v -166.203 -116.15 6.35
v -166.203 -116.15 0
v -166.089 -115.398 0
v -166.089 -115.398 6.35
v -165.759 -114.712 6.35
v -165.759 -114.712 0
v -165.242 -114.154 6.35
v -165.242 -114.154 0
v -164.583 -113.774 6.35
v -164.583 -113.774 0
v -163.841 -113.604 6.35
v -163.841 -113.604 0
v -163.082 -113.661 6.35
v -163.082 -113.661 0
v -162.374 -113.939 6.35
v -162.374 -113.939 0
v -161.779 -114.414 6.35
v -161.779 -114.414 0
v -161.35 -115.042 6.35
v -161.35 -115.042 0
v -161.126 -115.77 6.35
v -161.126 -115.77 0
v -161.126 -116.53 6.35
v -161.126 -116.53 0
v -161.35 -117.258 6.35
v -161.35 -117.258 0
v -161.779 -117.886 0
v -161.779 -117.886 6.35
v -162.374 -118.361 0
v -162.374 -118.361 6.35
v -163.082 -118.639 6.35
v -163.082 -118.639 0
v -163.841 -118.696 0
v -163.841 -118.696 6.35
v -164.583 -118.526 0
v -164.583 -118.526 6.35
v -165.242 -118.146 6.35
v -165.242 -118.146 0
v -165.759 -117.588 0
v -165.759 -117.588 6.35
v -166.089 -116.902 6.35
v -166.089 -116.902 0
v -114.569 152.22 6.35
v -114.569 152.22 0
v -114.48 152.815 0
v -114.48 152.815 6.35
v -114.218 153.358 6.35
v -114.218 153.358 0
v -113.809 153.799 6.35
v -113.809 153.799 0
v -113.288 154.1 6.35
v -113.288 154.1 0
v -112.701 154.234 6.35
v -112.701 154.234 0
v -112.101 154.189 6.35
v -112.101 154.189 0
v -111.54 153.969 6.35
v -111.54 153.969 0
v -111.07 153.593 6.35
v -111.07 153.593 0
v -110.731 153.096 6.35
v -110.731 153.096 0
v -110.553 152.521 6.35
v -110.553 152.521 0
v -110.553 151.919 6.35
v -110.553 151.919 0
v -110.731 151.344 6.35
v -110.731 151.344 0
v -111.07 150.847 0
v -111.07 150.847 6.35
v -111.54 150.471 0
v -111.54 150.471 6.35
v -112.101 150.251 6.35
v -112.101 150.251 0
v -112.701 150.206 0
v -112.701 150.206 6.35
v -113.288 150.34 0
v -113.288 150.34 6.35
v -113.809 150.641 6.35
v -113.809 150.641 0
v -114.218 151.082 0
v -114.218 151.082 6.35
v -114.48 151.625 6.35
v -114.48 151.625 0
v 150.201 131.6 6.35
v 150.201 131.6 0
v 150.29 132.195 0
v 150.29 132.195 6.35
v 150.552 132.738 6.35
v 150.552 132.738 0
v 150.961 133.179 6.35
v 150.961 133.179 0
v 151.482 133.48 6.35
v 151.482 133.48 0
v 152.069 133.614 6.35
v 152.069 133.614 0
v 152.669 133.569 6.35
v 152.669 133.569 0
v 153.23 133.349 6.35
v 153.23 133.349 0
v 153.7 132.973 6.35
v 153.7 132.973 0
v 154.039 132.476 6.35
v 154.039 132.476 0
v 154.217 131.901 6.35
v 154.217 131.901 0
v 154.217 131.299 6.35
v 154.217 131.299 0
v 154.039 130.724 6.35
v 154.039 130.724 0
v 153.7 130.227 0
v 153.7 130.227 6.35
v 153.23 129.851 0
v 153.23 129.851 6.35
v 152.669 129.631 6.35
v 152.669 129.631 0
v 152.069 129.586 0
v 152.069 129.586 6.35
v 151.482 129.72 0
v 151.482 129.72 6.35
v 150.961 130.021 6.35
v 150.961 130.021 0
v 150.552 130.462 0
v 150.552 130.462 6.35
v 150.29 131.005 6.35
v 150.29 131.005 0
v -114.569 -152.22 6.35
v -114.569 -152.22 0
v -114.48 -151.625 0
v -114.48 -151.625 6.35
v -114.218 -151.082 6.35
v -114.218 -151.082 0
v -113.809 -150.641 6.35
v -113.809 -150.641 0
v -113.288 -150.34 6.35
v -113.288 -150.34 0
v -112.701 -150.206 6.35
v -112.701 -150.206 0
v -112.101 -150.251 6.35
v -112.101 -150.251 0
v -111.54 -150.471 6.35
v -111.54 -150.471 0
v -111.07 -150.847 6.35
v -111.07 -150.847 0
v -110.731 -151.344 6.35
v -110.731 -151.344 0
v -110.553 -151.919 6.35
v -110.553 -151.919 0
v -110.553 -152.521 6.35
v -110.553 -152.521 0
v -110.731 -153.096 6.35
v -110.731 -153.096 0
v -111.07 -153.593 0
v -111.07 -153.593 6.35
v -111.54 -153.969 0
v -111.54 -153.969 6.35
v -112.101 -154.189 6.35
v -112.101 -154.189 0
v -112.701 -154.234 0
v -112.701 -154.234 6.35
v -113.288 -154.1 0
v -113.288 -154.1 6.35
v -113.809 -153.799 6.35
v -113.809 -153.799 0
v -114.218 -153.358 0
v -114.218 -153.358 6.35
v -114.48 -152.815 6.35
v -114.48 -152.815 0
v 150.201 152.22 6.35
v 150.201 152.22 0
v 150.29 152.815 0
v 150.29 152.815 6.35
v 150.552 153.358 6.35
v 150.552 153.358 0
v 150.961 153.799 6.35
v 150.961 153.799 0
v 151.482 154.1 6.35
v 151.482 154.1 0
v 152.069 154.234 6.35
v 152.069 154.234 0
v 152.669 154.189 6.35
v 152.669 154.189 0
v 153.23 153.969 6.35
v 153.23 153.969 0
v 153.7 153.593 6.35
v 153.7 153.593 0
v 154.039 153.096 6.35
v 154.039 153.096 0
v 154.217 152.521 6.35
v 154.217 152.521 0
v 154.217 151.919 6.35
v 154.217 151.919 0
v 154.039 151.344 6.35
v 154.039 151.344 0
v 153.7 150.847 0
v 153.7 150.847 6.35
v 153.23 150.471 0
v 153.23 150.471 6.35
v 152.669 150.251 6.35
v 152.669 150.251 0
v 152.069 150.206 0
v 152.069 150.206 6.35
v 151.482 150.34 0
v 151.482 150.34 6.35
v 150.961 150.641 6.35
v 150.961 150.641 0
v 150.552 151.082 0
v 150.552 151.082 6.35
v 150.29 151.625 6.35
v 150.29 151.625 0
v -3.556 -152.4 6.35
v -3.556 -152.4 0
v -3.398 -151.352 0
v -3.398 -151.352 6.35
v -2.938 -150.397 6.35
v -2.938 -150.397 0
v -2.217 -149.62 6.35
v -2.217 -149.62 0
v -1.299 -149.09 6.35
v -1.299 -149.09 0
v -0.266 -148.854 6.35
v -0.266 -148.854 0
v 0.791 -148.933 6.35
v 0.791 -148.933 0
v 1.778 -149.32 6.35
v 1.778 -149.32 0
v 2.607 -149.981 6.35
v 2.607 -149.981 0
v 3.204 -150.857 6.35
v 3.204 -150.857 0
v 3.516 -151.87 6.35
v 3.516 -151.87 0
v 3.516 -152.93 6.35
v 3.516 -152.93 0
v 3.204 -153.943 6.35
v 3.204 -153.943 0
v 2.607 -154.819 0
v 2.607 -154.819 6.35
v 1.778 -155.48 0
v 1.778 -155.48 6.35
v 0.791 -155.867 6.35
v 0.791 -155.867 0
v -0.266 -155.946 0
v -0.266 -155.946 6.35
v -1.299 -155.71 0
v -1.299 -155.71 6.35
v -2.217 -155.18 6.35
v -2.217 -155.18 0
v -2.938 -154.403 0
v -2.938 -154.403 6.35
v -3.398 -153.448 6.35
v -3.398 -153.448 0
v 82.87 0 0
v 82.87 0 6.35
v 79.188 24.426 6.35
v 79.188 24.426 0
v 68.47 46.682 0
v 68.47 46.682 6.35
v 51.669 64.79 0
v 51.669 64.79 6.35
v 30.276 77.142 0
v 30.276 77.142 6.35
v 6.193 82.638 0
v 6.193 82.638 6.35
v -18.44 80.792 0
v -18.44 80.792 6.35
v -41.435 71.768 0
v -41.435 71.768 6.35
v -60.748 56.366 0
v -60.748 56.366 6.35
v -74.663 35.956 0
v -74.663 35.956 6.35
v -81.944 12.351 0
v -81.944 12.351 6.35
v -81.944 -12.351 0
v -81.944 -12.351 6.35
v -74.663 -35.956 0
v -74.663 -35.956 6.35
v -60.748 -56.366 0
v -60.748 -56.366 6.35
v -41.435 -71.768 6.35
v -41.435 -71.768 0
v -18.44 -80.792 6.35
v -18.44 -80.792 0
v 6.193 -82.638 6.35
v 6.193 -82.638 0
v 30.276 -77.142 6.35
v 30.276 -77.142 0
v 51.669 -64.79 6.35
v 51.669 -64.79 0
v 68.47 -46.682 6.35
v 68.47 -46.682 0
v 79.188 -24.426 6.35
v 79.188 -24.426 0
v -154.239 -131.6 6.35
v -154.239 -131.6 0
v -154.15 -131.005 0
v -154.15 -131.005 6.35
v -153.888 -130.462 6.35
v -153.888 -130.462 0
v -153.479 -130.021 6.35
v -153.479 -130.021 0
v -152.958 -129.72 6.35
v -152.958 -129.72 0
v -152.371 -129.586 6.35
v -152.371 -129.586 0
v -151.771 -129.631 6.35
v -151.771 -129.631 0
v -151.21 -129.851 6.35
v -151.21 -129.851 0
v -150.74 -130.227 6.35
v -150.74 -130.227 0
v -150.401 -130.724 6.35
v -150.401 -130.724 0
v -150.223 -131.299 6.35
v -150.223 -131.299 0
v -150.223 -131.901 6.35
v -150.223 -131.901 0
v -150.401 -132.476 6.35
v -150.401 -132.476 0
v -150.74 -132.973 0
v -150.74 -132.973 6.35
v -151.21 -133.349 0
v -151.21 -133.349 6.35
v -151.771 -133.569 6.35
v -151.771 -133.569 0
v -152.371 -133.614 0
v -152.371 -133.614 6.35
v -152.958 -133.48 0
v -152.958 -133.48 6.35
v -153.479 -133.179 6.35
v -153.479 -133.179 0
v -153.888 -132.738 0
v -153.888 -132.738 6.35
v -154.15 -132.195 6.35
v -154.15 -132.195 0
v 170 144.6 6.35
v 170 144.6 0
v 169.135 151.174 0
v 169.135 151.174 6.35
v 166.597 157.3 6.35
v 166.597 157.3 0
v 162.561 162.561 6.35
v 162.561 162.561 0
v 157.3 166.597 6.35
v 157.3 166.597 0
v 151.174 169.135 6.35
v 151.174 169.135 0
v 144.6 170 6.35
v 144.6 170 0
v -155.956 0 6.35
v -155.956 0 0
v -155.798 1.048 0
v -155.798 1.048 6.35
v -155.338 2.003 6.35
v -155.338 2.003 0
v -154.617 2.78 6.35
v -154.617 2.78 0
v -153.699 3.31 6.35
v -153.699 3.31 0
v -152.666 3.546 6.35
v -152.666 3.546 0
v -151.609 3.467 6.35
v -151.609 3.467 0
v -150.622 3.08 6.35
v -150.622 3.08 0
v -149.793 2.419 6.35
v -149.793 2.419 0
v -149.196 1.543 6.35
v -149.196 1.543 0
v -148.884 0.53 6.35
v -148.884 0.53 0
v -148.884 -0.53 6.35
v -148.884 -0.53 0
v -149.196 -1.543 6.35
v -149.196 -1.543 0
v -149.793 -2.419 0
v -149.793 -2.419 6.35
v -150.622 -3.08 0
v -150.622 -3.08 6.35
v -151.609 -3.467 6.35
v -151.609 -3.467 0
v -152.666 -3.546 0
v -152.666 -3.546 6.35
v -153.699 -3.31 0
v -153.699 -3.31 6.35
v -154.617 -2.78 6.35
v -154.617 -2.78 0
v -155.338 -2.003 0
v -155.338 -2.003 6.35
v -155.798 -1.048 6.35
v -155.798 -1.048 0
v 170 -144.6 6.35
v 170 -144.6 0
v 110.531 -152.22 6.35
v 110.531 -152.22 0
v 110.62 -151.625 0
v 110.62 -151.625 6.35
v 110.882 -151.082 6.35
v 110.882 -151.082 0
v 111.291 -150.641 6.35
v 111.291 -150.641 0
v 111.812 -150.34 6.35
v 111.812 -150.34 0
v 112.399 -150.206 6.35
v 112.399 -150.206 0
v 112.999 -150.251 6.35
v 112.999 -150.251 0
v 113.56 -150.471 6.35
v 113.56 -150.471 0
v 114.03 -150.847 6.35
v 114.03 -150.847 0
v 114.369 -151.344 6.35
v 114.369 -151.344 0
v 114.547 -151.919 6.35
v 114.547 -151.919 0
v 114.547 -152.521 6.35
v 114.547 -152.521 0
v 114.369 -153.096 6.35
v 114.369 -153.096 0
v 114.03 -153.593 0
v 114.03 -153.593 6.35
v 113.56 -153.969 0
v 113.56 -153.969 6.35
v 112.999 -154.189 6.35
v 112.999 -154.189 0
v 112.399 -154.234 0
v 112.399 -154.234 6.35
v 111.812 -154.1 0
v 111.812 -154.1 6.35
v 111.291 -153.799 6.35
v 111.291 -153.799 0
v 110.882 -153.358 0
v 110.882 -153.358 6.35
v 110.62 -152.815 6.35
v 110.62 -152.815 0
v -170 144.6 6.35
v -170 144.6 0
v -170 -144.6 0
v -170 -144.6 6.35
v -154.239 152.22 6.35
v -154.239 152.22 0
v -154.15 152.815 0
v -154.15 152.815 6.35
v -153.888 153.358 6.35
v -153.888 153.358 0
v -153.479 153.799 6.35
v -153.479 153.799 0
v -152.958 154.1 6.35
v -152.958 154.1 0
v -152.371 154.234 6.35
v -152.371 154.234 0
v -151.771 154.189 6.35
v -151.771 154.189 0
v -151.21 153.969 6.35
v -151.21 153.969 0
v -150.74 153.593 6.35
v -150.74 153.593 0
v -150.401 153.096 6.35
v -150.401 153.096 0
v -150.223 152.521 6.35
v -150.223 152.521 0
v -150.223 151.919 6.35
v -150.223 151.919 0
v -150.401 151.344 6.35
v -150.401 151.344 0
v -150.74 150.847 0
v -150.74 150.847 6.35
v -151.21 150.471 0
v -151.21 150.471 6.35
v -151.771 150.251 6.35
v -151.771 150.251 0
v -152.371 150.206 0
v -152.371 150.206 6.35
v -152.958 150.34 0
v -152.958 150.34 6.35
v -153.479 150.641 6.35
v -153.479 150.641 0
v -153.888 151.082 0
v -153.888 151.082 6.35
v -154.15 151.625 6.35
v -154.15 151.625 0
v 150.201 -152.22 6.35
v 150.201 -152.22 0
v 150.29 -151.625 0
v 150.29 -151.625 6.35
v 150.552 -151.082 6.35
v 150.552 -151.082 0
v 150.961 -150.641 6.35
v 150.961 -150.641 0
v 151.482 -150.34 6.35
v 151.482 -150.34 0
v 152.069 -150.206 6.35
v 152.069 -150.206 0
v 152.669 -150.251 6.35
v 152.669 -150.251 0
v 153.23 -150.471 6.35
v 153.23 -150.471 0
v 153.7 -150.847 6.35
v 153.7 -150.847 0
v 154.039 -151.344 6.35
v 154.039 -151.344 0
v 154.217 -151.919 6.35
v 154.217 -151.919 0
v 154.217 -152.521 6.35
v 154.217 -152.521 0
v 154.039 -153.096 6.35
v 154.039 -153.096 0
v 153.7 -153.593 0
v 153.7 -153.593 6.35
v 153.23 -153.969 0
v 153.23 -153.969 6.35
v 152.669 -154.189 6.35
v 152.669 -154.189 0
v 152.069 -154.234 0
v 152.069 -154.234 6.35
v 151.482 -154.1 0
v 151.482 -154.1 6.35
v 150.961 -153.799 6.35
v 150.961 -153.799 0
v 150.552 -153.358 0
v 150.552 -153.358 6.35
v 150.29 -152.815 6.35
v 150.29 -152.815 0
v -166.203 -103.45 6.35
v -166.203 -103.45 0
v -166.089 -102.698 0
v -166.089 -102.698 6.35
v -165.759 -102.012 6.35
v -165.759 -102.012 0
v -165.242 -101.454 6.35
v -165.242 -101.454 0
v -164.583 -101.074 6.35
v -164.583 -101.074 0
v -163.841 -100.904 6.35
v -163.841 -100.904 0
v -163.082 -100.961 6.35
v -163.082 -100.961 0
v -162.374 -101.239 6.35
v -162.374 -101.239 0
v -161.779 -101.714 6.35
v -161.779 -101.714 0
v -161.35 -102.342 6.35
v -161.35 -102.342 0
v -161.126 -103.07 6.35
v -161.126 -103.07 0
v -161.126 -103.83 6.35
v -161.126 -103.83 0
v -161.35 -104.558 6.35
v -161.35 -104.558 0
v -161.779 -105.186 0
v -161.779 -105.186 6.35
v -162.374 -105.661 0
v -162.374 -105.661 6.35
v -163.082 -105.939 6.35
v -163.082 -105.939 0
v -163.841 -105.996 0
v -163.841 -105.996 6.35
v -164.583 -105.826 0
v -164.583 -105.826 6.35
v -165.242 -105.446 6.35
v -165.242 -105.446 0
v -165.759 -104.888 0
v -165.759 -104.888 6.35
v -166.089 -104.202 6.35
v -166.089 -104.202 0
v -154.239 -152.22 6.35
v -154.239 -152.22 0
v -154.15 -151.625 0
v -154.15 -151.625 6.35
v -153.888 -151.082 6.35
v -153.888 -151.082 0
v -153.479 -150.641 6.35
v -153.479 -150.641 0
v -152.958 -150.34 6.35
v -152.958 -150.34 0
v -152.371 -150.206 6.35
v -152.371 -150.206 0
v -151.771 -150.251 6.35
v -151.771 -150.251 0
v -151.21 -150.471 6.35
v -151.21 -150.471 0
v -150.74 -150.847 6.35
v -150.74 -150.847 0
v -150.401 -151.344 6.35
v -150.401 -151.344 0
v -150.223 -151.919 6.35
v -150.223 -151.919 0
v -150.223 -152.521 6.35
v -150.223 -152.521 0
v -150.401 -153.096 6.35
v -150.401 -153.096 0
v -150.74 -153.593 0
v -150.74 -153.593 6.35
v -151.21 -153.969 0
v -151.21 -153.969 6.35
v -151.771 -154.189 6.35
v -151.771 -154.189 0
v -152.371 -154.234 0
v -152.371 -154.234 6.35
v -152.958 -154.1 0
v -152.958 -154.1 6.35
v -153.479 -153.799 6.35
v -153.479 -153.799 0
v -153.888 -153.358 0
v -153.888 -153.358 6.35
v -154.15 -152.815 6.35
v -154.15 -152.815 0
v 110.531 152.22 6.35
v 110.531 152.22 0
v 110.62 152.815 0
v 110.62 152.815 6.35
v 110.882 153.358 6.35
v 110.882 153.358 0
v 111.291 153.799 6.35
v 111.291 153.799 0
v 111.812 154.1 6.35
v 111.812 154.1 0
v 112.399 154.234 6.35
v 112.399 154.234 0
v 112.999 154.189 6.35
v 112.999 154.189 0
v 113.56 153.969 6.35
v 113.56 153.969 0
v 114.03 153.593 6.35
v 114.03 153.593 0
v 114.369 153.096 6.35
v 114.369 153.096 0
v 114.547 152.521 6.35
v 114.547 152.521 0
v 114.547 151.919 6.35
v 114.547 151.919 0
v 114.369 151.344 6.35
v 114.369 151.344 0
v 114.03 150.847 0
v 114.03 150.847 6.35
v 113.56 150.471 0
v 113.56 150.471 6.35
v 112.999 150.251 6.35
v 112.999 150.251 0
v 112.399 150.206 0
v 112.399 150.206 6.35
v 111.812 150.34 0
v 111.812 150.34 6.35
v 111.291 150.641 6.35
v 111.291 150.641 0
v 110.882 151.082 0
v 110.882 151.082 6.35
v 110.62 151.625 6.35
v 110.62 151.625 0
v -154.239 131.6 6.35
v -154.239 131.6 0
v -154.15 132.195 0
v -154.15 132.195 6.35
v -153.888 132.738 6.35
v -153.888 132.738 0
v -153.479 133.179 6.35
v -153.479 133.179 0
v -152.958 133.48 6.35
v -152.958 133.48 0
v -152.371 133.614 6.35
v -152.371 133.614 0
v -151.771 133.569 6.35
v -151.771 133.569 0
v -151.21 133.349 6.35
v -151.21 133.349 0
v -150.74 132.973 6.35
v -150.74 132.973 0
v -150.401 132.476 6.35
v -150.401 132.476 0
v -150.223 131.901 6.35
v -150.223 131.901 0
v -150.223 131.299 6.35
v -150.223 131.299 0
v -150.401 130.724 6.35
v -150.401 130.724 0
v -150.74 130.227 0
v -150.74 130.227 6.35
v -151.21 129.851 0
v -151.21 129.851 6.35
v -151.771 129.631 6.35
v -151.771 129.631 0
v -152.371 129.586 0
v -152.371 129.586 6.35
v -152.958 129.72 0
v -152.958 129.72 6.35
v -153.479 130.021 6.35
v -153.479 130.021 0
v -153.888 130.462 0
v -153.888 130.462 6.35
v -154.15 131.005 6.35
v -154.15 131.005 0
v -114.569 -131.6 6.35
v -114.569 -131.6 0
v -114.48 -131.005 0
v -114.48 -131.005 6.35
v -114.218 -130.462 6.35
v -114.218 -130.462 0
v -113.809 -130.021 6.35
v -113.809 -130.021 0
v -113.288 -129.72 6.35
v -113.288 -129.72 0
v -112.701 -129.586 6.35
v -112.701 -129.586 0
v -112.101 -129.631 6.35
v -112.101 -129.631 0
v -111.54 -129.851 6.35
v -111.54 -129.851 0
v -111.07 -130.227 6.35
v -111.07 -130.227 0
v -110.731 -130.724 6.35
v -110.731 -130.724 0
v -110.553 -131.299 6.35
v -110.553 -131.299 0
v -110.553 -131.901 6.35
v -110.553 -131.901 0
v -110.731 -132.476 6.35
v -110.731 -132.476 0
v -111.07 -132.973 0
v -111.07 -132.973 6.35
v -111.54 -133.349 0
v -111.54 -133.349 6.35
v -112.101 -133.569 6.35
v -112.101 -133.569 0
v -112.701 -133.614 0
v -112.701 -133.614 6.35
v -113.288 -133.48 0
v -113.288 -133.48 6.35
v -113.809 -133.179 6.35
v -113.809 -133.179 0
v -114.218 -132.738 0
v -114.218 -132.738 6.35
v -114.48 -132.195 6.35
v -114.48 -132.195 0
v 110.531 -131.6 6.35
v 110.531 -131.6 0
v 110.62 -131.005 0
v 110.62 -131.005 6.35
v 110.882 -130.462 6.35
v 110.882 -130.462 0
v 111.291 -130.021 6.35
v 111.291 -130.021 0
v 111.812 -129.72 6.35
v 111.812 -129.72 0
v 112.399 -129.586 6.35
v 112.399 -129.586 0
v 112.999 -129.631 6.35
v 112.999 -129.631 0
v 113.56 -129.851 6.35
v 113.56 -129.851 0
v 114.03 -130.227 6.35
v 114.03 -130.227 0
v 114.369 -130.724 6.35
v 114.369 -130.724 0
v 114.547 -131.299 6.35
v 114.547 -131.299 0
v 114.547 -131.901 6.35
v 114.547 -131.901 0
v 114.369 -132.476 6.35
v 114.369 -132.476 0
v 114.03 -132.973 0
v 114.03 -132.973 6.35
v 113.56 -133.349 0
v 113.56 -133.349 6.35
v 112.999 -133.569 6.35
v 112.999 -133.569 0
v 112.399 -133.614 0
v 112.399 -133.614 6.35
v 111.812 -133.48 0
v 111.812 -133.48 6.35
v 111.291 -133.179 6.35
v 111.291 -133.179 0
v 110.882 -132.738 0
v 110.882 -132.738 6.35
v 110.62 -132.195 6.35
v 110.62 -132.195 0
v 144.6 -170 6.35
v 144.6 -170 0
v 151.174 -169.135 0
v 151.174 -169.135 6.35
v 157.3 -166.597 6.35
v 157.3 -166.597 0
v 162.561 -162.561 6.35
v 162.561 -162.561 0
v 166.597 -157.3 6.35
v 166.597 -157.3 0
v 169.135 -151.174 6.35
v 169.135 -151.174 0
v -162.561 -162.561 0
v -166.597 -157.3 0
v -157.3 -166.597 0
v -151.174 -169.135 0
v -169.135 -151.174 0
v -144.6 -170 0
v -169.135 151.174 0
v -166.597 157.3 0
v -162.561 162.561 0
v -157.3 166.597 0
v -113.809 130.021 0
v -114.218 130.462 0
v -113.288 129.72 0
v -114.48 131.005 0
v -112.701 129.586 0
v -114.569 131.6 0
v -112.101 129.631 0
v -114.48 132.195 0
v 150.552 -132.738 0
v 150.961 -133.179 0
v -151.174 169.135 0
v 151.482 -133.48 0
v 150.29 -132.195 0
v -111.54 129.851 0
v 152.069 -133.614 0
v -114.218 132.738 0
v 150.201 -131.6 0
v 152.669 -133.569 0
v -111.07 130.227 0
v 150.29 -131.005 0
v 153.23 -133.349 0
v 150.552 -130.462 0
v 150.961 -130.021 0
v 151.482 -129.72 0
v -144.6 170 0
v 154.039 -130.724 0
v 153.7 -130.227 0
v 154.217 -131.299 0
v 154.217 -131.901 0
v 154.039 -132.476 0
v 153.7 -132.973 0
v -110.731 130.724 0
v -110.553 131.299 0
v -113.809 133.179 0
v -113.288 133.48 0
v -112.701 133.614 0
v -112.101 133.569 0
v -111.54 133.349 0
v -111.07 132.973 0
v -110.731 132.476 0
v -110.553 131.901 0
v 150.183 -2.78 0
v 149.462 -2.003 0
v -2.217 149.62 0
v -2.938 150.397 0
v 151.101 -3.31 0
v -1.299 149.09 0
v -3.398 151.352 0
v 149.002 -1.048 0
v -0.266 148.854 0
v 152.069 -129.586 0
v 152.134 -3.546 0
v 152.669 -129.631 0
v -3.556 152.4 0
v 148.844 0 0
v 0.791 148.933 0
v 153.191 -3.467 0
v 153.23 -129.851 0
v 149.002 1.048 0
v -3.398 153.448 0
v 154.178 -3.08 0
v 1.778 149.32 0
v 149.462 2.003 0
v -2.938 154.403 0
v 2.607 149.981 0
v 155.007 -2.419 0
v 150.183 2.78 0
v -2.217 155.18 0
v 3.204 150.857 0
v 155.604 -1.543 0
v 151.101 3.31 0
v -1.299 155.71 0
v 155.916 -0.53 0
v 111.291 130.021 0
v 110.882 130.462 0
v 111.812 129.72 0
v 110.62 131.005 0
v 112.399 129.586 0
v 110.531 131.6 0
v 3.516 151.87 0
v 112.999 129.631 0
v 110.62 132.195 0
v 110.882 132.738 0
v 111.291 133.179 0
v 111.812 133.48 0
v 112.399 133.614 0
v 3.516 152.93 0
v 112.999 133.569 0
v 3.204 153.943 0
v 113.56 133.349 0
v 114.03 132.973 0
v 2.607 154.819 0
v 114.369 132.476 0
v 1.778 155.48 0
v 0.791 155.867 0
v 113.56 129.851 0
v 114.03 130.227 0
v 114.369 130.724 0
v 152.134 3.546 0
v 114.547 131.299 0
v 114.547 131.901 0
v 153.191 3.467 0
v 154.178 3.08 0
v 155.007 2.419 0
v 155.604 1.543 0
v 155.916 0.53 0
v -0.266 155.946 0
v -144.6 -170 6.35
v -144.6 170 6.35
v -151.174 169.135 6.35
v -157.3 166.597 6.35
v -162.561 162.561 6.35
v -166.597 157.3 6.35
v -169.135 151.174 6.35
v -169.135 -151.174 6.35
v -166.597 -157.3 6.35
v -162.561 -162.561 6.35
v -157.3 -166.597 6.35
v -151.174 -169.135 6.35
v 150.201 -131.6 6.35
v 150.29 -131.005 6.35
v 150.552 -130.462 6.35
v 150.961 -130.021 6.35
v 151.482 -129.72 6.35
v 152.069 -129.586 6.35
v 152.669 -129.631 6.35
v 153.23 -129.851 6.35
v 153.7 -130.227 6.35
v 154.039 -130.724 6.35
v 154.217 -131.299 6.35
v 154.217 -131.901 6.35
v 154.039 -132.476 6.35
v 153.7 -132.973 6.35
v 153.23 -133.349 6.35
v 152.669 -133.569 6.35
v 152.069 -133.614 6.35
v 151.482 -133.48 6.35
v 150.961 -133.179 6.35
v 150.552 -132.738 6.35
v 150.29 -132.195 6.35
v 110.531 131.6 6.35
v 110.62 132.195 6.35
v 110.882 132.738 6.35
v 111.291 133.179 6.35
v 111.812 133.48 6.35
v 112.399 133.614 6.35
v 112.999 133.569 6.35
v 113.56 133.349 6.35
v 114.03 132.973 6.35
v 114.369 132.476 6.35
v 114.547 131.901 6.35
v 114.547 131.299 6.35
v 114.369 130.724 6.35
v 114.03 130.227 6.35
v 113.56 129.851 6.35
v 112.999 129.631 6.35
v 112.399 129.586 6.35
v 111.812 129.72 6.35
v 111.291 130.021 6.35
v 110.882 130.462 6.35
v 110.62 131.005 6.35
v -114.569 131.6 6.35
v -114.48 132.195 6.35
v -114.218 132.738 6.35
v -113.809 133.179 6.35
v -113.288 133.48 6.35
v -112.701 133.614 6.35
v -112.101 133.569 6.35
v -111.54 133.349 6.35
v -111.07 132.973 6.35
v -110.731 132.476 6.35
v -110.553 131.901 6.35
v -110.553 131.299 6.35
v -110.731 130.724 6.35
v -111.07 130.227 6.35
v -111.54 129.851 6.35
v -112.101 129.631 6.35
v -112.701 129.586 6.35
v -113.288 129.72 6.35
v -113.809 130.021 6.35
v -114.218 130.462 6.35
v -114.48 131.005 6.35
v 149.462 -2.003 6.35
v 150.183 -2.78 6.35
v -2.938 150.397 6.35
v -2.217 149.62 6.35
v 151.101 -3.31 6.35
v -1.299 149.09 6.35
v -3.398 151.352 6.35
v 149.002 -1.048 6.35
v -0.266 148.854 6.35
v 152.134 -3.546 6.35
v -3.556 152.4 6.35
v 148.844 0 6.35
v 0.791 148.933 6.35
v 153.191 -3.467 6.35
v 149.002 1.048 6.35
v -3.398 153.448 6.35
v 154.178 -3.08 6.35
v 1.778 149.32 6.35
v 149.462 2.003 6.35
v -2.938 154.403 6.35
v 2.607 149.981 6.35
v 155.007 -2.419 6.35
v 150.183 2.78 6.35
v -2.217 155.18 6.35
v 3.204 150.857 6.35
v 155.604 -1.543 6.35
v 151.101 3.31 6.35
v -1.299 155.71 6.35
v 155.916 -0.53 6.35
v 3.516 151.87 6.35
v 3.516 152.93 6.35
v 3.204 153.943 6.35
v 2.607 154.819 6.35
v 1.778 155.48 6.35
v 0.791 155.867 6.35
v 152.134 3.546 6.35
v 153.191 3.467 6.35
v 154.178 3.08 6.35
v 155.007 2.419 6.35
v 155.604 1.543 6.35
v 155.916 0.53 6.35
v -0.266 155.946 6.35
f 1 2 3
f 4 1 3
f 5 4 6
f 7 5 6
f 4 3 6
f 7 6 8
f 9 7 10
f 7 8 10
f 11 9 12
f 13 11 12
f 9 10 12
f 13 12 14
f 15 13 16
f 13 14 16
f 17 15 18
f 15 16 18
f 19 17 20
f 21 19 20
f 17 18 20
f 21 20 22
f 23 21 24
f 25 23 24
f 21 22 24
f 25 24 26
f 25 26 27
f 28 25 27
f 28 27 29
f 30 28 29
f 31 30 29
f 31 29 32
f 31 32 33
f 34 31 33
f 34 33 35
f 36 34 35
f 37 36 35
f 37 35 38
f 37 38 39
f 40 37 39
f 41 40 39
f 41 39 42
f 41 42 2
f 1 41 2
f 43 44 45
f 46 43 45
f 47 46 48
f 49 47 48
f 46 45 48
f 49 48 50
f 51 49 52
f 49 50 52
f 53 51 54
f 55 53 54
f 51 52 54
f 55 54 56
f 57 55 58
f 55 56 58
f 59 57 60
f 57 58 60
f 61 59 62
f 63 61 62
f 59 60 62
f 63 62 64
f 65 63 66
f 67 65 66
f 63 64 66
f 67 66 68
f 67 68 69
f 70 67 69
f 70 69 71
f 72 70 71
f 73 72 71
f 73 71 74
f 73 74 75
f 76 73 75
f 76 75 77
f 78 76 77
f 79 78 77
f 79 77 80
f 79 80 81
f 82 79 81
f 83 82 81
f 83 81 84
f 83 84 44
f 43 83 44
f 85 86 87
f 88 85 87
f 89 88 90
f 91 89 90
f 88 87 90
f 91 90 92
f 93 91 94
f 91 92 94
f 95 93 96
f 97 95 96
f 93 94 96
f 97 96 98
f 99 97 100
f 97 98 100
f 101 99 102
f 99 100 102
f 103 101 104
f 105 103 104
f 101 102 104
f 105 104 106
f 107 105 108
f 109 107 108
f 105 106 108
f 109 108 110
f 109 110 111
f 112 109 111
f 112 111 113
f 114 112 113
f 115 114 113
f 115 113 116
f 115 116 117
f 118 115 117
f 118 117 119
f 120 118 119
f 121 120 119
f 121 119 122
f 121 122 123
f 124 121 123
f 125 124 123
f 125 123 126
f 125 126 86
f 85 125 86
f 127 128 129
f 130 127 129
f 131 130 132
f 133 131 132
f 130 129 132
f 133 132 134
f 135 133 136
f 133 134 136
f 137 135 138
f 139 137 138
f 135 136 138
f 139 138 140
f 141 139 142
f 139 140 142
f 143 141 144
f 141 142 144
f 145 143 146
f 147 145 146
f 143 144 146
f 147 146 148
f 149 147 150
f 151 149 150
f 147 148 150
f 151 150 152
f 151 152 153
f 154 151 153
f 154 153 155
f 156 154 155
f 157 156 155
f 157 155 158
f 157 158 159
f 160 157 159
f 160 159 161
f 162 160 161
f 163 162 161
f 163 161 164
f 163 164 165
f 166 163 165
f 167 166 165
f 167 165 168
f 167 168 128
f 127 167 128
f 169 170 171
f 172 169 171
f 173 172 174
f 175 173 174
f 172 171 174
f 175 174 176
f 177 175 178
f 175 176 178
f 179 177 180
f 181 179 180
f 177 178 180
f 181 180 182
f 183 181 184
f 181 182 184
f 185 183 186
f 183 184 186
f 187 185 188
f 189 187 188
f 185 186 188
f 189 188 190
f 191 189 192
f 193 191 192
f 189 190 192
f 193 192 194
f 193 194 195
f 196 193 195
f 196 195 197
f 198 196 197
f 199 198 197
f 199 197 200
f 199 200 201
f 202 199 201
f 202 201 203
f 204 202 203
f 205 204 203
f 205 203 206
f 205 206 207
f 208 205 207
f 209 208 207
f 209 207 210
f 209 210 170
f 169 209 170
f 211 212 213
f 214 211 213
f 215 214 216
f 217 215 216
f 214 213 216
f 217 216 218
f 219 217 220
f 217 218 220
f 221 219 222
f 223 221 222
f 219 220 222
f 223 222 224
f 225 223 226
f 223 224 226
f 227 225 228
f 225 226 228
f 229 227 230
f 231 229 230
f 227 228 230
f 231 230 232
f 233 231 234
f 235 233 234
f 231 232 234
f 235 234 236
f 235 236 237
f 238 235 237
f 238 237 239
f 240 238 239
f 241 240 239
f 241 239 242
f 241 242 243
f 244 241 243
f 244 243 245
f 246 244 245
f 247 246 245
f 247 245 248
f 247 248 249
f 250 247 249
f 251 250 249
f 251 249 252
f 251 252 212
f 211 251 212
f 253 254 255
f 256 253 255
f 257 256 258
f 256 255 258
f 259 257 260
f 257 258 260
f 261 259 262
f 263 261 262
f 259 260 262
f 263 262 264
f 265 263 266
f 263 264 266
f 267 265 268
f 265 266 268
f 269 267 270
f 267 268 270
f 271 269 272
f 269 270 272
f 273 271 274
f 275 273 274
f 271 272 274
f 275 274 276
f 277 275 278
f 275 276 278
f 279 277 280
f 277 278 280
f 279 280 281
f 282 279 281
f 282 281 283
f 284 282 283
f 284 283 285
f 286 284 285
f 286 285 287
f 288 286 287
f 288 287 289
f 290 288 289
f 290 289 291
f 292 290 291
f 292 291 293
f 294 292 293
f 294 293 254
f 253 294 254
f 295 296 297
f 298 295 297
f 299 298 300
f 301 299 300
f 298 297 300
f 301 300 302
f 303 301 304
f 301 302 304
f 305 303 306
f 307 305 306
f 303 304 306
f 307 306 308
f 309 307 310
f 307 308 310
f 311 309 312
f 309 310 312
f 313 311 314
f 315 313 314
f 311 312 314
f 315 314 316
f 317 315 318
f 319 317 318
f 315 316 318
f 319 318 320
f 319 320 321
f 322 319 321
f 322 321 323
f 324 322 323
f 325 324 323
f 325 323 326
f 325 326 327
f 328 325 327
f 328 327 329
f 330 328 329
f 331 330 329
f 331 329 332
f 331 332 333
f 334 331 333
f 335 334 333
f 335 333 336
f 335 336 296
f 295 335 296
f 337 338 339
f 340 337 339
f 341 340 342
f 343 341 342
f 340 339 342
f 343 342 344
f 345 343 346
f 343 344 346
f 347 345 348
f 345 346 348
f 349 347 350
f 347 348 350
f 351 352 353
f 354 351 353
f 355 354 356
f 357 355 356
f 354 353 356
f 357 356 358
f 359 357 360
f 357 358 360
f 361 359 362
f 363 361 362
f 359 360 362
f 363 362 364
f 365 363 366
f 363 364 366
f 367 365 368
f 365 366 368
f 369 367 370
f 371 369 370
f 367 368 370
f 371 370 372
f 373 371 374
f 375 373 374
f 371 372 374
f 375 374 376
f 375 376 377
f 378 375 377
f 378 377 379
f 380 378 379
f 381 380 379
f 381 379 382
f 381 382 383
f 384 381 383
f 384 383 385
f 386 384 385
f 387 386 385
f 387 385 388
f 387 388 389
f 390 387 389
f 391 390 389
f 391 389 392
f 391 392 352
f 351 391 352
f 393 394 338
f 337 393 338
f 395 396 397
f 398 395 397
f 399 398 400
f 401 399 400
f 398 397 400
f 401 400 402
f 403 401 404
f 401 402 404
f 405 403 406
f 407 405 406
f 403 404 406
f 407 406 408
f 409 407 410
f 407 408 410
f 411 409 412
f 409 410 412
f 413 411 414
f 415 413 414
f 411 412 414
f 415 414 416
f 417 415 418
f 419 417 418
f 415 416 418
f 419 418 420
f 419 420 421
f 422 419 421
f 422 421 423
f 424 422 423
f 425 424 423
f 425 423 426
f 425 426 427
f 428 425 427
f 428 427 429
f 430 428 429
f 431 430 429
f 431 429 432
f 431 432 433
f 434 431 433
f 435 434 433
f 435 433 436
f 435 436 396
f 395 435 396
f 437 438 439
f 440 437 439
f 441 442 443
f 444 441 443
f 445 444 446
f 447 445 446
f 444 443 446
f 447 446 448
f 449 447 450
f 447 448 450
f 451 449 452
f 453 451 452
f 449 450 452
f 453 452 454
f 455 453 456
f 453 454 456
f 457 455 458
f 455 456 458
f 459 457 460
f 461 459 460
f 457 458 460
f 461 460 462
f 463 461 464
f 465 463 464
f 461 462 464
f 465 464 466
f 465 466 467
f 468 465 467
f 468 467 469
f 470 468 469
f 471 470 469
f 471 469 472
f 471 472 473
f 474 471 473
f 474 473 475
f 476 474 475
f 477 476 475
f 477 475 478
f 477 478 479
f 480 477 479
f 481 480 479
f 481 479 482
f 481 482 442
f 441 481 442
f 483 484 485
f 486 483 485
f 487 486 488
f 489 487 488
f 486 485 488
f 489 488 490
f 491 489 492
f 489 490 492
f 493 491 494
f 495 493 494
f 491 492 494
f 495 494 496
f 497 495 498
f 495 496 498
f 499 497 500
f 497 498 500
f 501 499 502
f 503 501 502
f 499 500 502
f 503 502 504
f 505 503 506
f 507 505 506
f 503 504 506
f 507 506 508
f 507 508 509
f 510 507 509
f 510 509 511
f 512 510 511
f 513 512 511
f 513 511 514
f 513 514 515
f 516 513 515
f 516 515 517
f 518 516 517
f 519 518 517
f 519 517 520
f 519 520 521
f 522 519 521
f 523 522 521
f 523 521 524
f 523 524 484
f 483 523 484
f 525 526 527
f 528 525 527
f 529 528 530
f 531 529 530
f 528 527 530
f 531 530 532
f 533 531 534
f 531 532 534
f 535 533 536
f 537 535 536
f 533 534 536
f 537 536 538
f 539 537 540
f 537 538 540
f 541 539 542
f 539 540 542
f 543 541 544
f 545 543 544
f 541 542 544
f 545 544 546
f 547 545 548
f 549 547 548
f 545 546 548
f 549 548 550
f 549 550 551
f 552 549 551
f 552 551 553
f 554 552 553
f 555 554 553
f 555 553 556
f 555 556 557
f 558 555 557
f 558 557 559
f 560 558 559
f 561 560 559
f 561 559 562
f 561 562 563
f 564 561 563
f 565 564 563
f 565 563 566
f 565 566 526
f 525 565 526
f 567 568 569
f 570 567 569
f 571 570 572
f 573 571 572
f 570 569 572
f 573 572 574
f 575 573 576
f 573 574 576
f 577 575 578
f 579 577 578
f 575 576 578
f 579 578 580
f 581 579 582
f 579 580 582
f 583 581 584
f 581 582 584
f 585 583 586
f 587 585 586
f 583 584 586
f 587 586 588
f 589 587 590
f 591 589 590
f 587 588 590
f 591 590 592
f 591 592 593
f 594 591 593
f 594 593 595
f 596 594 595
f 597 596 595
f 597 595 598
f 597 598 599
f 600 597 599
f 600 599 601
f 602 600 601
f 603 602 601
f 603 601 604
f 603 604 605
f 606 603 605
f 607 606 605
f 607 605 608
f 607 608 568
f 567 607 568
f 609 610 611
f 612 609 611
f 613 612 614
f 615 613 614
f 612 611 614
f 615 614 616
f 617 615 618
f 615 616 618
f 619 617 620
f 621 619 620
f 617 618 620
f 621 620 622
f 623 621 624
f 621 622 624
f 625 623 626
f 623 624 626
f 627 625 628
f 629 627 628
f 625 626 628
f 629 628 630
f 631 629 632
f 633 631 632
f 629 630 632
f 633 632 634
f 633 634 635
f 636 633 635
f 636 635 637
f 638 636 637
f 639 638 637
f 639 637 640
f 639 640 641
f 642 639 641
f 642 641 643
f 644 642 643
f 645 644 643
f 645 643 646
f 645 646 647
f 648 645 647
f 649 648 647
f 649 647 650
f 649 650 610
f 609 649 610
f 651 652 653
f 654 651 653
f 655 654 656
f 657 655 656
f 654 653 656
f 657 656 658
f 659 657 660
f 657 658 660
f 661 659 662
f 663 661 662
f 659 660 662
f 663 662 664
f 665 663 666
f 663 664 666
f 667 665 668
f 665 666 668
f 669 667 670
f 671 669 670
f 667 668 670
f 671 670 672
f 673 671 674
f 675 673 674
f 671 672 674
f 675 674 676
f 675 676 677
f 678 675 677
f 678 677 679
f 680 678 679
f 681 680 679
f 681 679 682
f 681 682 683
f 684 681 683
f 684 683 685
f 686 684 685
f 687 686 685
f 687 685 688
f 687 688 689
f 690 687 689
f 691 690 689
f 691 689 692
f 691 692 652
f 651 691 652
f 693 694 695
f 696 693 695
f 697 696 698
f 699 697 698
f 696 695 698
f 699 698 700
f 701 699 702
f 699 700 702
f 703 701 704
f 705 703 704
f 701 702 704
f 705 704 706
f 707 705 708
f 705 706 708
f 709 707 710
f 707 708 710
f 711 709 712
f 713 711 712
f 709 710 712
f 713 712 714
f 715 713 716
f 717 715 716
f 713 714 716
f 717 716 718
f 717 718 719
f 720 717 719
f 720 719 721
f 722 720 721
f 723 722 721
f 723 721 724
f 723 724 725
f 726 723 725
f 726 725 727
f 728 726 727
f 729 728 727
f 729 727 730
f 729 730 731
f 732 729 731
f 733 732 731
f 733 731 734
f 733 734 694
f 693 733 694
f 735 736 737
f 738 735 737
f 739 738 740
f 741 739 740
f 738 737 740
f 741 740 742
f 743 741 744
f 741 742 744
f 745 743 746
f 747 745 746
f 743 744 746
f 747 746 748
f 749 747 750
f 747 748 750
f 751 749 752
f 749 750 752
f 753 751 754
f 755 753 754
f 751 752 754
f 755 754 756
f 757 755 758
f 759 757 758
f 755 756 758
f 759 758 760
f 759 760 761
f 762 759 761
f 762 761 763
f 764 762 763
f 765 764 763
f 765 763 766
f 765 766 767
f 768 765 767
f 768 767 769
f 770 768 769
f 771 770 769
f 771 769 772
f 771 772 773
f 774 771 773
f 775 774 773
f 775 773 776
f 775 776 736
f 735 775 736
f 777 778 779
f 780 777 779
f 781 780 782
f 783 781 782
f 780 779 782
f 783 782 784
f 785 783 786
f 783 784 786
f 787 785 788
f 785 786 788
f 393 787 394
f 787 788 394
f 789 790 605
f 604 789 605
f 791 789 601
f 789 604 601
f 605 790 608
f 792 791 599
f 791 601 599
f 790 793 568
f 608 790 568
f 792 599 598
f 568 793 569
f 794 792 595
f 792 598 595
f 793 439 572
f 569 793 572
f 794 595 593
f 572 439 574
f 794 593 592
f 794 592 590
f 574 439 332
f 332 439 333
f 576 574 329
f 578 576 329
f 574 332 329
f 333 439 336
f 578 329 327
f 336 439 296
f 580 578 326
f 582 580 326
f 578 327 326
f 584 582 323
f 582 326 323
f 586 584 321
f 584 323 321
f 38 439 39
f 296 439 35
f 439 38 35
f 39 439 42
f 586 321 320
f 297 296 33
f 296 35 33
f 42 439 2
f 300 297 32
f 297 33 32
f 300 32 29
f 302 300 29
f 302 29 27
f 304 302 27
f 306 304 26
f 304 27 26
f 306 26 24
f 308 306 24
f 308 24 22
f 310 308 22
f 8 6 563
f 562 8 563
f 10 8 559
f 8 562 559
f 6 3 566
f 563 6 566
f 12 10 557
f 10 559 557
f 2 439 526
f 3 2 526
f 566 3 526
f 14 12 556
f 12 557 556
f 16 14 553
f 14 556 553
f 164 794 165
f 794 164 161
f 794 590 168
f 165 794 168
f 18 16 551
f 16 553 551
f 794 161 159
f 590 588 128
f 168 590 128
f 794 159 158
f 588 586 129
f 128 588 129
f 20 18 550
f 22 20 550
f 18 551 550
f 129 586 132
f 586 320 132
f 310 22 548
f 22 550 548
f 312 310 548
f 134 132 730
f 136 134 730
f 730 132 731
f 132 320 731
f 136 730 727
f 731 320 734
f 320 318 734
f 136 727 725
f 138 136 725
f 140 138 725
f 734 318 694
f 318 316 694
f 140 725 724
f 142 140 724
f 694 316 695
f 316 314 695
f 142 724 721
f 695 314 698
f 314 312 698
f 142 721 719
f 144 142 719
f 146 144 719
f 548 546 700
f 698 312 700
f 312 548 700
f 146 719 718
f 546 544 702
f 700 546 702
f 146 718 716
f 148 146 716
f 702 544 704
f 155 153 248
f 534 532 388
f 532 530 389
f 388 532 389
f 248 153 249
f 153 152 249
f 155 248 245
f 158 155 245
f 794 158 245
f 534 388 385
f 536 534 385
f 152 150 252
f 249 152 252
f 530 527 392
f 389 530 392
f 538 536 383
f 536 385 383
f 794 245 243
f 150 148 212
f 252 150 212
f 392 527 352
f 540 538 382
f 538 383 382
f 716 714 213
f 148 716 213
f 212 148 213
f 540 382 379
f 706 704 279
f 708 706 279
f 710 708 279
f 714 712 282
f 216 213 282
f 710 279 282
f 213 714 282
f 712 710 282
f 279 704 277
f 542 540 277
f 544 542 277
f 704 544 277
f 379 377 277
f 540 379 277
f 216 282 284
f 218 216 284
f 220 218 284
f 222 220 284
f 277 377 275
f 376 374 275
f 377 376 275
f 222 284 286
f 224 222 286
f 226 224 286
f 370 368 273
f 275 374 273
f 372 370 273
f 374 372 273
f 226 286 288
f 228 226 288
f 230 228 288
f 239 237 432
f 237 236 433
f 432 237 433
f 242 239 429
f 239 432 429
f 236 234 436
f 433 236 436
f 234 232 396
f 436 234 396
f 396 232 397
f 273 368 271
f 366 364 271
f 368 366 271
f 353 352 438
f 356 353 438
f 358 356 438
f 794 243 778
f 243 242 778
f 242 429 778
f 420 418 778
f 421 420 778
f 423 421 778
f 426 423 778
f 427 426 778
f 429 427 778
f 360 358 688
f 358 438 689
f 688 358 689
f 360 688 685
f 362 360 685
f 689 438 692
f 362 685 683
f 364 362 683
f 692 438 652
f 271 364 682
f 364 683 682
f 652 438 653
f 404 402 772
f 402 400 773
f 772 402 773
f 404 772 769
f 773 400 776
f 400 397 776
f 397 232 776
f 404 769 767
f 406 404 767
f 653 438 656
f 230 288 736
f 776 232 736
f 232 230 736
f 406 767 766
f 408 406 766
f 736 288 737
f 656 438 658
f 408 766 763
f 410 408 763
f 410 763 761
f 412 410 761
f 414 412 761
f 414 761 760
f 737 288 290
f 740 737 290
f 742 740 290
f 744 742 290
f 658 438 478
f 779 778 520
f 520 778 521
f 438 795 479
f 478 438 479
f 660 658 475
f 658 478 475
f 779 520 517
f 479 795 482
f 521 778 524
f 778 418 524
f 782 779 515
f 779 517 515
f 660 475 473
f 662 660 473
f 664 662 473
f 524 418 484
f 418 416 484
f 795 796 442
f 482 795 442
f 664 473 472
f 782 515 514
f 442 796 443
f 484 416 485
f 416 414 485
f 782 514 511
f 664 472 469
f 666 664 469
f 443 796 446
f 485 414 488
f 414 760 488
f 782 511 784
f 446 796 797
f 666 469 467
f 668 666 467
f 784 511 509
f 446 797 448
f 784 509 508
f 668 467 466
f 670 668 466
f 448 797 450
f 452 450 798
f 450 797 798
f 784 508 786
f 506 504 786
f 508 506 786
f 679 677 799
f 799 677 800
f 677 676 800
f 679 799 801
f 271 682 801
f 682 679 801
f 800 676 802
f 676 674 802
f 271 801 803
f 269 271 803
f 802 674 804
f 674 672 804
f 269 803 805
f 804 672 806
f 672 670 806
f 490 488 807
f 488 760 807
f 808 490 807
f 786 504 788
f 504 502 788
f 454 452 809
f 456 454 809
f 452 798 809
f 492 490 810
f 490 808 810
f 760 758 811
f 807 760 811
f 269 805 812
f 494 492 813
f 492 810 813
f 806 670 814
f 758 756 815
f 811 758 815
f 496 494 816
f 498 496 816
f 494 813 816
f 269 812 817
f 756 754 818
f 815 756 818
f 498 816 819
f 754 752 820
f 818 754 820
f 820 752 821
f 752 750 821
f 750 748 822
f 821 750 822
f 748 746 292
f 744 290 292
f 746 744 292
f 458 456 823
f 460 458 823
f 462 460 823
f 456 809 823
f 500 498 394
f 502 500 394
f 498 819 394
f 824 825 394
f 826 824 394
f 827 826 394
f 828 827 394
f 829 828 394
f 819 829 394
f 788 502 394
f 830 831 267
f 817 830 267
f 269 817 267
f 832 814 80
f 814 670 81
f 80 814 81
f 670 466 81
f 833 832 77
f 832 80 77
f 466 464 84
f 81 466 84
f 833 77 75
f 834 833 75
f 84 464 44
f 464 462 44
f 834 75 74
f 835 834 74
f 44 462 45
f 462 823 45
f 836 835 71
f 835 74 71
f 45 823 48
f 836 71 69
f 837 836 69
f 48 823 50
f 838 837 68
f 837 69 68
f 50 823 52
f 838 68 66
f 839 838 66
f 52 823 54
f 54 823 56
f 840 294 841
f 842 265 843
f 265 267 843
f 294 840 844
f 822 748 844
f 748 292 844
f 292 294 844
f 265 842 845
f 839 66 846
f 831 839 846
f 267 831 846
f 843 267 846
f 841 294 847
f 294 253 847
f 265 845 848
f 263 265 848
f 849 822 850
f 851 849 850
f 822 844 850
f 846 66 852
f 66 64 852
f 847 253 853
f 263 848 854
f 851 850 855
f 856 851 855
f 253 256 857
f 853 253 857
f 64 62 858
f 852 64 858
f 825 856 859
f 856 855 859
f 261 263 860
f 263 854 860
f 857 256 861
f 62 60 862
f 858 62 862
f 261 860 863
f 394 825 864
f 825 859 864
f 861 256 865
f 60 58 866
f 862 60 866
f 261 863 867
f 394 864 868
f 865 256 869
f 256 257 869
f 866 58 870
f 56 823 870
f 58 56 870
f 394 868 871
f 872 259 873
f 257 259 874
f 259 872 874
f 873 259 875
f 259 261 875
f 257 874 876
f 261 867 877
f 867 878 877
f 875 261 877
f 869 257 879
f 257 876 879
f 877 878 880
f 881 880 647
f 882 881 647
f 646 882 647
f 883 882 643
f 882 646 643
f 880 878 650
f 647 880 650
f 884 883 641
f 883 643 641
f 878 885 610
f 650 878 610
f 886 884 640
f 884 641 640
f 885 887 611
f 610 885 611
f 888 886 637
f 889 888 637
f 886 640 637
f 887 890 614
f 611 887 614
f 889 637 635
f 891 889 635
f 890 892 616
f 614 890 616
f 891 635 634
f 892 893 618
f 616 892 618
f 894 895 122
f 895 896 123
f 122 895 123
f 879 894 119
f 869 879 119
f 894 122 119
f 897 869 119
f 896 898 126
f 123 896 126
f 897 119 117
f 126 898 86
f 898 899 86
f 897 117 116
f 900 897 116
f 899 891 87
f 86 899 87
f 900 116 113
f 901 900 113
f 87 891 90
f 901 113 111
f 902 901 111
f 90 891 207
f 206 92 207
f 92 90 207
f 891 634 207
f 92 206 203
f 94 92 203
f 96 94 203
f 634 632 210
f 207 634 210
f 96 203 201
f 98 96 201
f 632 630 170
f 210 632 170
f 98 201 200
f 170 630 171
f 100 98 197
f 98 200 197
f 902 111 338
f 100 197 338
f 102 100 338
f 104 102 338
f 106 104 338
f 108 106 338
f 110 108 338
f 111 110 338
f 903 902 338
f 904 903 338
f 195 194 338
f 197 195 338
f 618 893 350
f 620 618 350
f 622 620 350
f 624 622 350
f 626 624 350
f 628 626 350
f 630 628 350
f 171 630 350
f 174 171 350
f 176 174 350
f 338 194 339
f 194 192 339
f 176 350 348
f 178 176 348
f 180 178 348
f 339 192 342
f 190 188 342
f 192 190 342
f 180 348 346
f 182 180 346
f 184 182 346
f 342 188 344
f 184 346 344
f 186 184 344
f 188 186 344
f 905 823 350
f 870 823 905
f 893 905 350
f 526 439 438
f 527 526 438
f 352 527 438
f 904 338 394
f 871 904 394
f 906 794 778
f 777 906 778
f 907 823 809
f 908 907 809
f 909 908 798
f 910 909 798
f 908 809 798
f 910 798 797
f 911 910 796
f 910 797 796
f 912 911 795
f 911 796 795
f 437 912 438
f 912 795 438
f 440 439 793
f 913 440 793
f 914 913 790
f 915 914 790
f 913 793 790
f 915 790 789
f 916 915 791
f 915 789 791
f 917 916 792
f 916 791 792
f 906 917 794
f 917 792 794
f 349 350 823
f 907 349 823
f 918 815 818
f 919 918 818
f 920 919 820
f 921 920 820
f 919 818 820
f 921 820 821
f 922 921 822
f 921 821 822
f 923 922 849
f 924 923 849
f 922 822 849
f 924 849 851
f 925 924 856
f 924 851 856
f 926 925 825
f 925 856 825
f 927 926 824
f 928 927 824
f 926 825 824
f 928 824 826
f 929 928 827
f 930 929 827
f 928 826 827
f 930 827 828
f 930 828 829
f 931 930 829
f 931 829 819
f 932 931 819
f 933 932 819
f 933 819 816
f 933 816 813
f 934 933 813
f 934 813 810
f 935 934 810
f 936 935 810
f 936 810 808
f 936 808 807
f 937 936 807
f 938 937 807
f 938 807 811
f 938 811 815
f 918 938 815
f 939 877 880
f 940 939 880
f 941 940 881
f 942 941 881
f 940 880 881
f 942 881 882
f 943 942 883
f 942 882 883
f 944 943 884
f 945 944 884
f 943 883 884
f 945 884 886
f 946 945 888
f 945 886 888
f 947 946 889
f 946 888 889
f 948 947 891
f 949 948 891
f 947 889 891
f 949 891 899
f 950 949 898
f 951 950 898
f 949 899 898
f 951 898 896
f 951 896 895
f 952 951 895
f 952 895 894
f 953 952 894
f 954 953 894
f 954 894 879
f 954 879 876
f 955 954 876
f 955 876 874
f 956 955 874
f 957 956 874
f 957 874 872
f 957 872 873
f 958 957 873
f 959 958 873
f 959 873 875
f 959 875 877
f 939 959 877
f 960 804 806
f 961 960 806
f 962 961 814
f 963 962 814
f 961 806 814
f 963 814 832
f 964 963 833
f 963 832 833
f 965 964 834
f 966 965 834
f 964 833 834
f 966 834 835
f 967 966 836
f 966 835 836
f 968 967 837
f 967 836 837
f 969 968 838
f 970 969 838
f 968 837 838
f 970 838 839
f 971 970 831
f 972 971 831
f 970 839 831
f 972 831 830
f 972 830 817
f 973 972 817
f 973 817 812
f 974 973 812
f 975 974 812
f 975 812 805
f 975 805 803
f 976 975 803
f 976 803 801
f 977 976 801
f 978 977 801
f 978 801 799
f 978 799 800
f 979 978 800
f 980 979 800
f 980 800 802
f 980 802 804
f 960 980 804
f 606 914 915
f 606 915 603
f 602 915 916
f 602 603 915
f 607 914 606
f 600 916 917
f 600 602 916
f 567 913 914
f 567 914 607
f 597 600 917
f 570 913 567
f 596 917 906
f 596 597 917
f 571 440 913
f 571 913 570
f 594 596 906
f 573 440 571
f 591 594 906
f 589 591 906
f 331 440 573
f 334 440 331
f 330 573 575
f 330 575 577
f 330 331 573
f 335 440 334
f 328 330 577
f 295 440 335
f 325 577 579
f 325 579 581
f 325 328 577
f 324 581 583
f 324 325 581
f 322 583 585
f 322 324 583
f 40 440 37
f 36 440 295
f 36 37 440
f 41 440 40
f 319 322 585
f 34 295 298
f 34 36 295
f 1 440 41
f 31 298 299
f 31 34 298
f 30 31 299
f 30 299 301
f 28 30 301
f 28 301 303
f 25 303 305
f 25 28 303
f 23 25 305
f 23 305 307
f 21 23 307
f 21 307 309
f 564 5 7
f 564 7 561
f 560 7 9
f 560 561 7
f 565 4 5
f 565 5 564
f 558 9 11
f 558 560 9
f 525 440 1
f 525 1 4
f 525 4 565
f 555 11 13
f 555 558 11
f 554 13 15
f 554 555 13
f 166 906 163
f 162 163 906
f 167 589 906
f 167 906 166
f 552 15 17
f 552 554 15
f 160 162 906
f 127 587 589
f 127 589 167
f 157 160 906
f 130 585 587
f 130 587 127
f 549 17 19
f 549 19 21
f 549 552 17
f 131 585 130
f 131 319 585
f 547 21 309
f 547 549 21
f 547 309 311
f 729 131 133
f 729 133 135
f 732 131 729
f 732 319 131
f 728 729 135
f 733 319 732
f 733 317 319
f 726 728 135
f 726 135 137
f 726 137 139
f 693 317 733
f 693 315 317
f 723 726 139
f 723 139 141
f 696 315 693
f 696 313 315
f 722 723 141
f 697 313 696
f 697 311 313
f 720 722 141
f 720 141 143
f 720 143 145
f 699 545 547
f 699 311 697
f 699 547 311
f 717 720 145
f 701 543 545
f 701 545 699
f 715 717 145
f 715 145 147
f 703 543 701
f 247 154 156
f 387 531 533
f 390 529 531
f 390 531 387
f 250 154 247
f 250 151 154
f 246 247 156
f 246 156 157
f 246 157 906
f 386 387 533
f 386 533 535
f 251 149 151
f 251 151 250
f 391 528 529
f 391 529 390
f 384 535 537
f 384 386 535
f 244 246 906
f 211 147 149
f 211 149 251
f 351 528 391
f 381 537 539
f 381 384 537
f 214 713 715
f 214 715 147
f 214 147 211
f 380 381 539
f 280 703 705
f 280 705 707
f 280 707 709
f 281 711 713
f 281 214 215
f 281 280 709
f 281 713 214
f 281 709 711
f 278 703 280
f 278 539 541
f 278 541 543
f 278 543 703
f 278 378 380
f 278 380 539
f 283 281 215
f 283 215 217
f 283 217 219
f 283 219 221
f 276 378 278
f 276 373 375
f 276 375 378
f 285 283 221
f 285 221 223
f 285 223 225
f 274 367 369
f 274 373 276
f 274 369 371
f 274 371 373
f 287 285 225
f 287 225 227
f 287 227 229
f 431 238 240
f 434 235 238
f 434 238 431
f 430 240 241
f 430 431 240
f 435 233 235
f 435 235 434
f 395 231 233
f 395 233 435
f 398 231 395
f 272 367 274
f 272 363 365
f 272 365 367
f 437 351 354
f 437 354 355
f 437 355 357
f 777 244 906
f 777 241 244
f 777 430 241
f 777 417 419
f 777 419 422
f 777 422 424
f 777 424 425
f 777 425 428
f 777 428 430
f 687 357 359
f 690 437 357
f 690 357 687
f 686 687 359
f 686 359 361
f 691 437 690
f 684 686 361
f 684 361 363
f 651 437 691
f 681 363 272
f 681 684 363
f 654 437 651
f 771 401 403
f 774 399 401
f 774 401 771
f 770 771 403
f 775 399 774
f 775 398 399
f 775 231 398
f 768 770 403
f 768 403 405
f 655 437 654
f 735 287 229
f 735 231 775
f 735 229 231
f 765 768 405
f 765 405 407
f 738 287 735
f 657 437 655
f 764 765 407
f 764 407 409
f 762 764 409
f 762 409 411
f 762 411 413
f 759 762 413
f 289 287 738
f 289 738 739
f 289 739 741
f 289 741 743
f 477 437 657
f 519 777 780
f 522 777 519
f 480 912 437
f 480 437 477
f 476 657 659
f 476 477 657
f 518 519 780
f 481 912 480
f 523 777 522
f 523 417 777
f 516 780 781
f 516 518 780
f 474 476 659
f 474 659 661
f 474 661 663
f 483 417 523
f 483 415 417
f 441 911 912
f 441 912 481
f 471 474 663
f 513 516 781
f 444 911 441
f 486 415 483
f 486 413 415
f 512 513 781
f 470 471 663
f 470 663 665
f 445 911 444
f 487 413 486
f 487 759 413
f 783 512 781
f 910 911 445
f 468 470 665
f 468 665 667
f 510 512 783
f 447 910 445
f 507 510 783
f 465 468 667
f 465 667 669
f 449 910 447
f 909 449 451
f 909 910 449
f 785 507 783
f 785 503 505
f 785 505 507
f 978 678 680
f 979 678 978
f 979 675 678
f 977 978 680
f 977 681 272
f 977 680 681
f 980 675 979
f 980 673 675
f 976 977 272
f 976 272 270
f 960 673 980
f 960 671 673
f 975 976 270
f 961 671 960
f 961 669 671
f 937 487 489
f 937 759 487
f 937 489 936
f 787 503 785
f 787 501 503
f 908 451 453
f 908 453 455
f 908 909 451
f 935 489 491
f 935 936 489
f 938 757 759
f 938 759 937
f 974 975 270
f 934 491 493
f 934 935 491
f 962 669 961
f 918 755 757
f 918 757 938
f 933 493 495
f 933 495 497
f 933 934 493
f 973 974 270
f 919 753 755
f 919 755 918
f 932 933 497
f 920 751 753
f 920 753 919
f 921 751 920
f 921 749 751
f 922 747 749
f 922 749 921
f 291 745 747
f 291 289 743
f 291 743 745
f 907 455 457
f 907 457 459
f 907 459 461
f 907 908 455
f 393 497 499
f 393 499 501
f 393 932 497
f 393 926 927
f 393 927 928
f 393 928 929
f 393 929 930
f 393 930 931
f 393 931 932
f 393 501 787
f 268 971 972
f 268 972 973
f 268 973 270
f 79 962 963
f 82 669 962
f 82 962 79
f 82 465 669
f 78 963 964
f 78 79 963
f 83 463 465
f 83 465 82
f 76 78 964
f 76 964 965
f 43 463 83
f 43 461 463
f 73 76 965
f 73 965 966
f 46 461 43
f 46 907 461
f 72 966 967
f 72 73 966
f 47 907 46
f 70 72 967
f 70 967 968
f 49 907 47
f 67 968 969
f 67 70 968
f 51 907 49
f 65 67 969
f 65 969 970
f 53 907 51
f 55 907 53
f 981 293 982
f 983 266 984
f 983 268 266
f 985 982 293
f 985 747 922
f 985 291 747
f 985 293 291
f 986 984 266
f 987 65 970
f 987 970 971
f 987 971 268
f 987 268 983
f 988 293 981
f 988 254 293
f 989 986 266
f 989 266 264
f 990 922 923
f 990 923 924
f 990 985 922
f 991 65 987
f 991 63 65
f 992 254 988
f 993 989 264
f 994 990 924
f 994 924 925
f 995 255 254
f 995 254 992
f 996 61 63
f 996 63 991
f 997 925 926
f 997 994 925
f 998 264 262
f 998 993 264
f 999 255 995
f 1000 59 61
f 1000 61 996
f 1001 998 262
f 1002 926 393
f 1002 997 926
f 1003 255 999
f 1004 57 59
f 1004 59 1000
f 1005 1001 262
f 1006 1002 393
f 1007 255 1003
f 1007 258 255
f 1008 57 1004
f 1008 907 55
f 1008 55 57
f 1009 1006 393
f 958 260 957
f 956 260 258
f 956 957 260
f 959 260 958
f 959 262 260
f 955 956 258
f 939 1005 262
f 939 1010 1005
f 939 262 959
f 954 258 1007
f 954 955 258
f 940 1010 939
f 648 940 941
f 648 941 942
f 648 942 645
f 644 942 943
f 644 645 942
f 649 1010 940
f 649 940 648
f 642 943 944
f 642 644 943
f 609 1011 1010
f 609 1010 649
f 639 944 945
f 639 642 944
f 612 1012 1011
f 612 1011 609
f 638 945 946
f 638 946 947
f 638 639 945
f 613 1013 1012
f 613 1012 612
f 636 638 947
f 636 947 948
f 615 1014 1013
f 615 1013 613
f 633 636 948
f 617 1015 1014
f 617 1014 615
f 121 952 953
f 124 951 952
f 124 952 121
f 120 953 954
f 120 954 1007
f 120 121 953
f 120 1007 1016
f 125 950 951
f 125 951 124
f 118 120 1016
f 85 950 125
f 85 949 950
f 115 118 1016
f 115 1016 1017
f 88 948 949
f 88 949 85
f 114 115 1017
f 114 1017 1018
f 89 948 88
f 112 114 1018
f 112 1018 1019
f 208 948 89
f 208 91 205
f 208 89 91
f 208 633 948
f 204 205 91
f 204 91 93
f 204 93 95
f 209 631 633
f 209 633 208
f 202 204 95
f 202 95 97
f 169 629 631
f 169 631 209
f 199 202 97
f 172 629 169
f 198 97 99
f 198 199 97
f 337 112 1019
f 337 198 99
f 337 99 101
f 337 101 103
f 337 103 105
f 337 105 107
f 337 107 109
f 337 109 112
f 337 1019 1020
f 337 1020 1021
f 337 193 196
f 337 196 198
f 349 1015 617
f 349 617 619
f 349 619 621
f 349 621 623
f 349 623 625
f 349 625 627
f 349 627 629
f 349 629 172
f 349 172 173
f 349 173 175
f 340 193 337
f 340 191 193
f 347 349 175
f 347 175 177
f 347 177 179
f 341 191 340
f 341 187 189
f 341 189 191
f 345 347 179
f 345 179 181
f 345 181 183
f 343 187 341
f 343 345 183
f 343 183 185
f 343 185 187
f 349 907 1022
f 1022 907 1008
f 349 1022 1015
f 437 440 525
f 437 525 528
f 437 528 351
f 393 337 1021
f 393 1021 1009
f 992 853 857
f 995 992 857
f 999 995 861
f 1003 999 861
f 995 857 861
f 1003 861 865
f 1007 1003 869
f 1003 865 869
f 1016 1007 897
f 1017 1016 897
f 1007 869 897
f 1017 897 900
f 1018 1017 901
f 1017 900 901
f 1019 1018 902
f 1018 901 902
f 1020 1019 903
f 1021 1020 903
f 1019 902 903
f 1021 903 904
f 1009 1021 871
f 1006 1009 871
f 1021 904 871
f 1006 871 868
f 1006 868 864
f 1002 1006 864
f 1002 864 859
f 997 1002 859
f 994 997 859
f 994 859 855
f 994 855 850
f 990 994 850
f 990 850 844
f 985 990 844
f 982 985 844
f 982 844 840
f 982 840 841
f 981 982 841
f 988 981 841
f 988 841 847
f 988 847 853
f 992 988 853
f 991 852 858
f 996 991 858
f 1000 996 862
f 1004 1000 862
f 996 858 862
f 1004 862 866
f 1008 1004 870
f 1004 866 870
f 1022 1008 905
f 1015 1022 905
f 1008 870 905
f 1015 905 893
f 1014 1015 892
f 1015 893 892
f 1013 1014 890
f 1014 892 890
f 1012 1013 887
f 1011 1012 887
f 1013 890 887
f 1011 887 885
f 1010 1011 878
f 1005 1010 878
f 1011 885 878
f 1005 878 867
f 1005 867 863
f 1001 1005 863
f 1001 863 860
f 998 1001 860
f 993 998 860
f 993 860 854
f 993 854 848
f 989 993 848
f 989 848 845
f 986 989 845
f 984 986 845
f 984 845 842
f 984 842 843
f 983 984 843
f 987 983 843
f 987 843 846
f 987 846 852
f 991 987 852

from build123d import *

# Parameters (mm, degrees)
F1_DEPTH = 6.35
F2_R     = 82.87
F3_DEPTH = 6.351
F4_D     = 4.0386
F5_D     = 7.112
F6_D     = 5.1054


with BuildPart() as f1:
    # F0 (on Top) → F1 (new body)
    with BuildSketch(Plane.XY):
        with BuildLine():
            Line((144.6, 170), (-144.6, 170))
            ThreePointArc((-144.6, 170), (-162.5605122421, 162.5605122421), (-170, 144.6))
            Line((-170, 144.6), (-170, -144.6))
            ThreePointArc((-170, -144.6), (-162.5605122421, -162.5605122421), (-144.6, -170))
            Line((-144.6, -170), (144.6, -170))
            ThreePointArc((144.6, -170), (162.5605122421, -162.5605122421), (170, -144.6))
            Line((170, -144.6), (170, 144.6))
            ThreePointArc((170, 144.6), (162.5605122421, 162.5605122421), (144.6, 170))
        make_face()
    extrude(amount=F1_DEPTH)

    # F2 (on face) → F3 (cut, through all)
    with BuildSketch(Plane.XY.offset(6.35)):
        Circle(F2_R)
    extrude(amount=-F3_DEPTH, mode=Mode.SUBTRACT)

    # F4 (through all)
    with Locations(Plane.XY.offset(6.35)):
        with Locations((-152.22, 131.6), (-152.22, 152.22), (-112.55, 152.22), (-112.55, 131.6), (152.22, 131.6), (152.22, 152.22), (112.55, 152.22), (112.55, 131.6), (152.22, -131.6), (152.22, -152.22), (112.55, -152.22), (112.55, -131.6), (-112.55, -152.22), (-112.55, -131.6), (-152.22, -131.6), (-152.22, -152.22)):
            Hole(F4_D / 2)

    # F5 (through all)
    with Locations(Plane.XY.offset(6.35)):
        with Locations((0, 152.4), (152.4, 0), (0, -152.4), (-152.4, 0)):
            Hole(F5_D / 2)

    # F6 (through all)
    with Locations(Plane.XY.offset(6.35)):
        with Locations((-163.65, -116.15), (-163.65, -103.45)):
            Hole(F6_D / 2)


solid = f1.part
